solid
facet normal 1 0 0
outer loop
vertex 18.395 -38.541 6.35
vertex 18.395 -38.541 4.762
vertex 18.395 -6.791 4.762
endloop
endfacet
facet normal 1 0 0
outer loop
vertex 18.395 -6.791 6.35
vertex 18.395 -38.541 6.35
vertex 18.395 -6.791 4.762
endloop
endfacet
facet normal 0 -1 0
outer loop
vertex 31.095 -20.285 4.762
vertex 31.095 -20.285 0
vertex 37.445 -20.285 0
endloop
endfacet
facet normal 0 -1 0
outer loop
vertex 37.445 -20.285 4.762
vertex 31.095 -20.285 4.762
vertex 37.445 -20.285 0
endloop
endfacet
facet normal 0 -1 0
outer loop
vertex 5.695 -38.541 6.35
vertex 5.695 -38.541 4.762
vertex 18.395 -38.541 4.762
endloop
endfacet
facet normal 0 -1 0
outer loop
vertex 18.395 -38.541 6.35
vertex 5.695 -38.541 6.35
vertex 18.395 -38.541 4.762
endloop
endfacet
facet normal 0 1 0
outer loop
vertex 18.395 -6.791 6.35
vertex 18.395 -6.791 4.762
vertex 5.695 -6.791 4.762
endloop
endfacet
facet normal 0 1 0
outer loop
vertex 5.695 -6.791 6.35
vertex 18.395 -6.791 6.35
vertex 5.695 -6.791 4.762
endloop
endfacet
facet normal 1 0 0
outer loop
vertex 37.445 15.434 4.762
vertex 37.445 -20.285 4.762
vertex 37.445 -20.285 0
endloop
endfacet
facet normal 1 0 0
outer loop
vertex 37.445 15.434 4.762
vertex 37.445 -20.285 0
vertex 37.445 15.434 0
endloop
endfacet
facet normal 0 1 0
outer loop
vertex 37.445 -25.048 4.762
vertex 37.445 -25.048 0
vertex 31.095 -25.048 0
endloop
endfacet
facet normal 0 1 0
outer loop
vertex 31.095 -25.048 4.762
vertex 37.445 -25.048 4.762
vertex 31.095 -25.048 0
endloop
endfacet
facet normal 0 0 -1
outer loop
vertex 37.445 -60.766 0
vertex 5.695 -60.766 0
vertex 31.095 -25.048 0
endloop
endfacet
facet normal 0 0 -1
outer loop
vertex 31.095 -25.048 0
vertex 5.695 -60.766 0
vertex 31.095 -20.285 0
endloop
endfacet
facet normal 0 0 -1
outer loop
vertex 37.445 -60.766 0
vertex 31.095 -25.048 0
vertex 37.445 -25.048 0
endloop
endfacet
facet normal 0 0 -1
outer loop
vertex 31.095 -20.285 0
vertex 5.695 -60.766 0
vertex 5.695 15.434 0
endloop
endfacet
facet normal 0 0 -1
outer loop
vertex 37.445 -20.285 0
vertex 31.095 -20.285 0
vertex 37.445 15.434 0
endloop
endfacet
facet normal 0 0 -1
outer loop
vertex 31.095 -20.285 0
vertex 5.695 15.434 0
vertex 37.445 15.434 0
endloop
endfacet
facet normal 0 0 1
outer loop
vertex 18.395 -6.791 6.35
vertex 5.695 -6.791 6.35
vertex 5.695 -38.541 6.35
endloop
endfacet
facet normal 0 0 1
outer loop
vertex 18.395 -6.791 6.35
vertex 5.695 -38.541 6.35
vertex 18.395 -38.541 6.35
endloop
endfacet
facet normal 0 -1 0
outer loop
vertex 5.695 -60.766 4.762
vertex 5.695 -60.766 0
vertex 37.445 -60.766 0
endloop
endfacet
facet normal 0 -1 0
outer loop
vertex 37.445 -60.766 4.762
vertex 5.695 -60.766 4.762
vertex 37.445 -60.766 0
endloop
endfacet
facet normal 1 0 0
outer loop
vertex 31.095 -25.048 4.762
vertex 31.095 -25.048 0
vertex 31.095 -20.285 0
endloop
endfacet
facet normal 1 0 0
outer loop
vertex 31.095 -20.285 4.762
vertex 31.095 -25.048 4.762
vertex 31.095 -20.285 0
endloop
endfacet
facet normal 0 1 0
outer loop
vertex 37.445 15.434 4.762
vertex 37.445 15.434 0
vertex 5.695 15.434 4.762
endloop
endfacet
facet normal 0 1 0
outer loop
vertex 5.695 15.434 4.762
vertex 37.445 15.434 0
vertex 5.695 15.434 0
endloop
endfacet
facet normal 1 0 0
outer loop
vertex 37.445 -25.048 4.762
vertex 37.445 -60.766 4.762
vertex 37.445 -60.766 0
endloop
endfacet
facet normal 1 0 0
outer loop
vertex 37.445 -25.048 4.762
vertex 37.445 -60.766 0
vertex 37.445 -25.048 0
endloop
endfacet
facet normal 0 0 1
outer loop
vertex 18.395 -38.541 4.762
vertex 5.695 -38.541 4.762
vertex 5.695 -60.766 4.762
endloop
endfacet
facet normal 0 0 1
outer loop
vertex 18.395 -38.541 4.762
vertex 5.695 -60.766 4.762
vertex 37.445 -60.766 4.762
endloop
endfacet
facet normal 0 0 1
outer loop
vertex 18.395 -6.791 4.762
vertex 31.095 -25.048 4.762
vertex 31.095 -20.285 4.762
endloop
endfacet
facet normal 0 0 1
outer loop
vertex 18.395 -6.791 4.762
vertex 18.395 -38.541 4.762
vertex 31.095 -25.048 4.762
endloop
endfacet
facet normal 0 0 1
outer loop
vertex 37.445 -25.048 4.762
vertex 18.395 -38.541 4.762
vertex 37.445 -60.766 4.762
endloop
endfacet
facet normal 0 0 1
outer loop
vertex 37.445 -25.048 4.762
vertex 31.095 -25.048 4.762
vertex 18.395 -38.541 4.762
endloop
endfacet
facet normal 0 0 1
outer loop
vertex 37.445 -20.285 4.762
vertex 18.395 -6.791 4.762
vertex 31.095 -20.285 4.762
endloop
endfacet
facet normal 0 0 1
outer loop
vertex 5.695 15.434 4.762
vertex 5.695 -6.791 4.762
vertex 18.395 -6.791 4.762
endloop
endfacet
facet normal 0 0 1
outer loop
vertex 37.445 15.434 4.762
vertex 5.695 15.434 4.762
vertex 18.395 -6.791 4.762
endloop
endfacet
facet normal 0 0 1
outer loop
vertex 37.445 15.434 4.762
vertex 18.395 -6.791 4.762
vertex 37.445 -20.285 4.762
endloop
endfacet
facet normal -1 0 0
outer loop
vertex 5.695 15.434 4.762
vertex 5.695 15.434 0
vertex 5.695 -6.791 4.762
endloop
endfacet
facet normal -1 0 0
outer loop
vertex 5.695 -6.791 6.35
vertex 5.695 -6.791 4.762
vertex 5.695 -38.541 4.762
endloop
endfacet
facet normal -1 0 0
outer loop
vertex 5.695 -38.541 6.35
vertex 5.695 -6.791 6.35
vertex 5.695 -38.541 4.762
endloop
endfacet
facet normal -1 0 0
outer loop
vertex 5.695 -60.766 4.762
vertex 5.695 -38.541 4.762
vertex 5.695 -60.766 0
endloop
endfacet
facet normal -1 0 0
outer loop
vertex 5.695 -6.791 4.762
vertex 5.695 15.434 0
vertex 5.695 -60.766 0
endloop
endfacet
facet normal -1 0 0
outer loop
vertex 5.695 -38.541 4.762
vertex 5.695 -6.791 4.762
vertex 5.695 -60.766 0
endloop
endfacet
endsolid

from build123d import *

# Parameters (mm, degrees)
BOSS_EXTRUDE3_DEPTH = 4.7625
BOSS_EXTRUDE5_DEPTH = 1.5875
SKETCH12_W          = 6.35
SKETCH12_H          = 35.71875
CUT_EXTRUDE1_DEPTH  = 9.652


with BuildPart() as part:
    # Sketch1 → Boss-Extrude3 (new body)
    with BuildSketch(Plane.XY):
        Polygon((43.795067265, 15.433632287), (5.695067265, 15.433632287), (5.695067265, -60.766367713), (43.795067265, -60.766367713), (43.795067265, -25.047617713), (31.095067265, -25.047617713), (31.095067265, -20.285117713), (43.795067265, -20.285117713), align=None)
    extrude(amount=BOSS_EXTRUDE3_DEPTH)

    # Sketch3 → Boss-Extrude5 (add)
    with BuildSketch(Plane.XY.offset(4.7625)):
        Polygon((18.395067265, -6.791367713), (5.695067265, -6.791367713), (5.695067265, -22.666367713), (5.695067265, -38.541367713), (18.395067265, -38.541367713), align=None)
    extrude(amount=BOSS_EXTRUDE5_DEPTH)

    # Sketch12 → Cut-Extrude1 (cut)
    with BuildSketch(Plane.XY.offset(4.7625)):
        with Locations((40.620067265, -42.906992713)):
            Rectangle(SKETCH12_W, SKETCH12_H)
        with Locations((40.620067265, -2.425742713)):
            Rectangle(SKETCH12_W, SKETCH12_H)
    extrude(amount=-CUT_EXTRUDE1_DEPTH, mode=Mode.SUBTRACT)


solid = part.part
